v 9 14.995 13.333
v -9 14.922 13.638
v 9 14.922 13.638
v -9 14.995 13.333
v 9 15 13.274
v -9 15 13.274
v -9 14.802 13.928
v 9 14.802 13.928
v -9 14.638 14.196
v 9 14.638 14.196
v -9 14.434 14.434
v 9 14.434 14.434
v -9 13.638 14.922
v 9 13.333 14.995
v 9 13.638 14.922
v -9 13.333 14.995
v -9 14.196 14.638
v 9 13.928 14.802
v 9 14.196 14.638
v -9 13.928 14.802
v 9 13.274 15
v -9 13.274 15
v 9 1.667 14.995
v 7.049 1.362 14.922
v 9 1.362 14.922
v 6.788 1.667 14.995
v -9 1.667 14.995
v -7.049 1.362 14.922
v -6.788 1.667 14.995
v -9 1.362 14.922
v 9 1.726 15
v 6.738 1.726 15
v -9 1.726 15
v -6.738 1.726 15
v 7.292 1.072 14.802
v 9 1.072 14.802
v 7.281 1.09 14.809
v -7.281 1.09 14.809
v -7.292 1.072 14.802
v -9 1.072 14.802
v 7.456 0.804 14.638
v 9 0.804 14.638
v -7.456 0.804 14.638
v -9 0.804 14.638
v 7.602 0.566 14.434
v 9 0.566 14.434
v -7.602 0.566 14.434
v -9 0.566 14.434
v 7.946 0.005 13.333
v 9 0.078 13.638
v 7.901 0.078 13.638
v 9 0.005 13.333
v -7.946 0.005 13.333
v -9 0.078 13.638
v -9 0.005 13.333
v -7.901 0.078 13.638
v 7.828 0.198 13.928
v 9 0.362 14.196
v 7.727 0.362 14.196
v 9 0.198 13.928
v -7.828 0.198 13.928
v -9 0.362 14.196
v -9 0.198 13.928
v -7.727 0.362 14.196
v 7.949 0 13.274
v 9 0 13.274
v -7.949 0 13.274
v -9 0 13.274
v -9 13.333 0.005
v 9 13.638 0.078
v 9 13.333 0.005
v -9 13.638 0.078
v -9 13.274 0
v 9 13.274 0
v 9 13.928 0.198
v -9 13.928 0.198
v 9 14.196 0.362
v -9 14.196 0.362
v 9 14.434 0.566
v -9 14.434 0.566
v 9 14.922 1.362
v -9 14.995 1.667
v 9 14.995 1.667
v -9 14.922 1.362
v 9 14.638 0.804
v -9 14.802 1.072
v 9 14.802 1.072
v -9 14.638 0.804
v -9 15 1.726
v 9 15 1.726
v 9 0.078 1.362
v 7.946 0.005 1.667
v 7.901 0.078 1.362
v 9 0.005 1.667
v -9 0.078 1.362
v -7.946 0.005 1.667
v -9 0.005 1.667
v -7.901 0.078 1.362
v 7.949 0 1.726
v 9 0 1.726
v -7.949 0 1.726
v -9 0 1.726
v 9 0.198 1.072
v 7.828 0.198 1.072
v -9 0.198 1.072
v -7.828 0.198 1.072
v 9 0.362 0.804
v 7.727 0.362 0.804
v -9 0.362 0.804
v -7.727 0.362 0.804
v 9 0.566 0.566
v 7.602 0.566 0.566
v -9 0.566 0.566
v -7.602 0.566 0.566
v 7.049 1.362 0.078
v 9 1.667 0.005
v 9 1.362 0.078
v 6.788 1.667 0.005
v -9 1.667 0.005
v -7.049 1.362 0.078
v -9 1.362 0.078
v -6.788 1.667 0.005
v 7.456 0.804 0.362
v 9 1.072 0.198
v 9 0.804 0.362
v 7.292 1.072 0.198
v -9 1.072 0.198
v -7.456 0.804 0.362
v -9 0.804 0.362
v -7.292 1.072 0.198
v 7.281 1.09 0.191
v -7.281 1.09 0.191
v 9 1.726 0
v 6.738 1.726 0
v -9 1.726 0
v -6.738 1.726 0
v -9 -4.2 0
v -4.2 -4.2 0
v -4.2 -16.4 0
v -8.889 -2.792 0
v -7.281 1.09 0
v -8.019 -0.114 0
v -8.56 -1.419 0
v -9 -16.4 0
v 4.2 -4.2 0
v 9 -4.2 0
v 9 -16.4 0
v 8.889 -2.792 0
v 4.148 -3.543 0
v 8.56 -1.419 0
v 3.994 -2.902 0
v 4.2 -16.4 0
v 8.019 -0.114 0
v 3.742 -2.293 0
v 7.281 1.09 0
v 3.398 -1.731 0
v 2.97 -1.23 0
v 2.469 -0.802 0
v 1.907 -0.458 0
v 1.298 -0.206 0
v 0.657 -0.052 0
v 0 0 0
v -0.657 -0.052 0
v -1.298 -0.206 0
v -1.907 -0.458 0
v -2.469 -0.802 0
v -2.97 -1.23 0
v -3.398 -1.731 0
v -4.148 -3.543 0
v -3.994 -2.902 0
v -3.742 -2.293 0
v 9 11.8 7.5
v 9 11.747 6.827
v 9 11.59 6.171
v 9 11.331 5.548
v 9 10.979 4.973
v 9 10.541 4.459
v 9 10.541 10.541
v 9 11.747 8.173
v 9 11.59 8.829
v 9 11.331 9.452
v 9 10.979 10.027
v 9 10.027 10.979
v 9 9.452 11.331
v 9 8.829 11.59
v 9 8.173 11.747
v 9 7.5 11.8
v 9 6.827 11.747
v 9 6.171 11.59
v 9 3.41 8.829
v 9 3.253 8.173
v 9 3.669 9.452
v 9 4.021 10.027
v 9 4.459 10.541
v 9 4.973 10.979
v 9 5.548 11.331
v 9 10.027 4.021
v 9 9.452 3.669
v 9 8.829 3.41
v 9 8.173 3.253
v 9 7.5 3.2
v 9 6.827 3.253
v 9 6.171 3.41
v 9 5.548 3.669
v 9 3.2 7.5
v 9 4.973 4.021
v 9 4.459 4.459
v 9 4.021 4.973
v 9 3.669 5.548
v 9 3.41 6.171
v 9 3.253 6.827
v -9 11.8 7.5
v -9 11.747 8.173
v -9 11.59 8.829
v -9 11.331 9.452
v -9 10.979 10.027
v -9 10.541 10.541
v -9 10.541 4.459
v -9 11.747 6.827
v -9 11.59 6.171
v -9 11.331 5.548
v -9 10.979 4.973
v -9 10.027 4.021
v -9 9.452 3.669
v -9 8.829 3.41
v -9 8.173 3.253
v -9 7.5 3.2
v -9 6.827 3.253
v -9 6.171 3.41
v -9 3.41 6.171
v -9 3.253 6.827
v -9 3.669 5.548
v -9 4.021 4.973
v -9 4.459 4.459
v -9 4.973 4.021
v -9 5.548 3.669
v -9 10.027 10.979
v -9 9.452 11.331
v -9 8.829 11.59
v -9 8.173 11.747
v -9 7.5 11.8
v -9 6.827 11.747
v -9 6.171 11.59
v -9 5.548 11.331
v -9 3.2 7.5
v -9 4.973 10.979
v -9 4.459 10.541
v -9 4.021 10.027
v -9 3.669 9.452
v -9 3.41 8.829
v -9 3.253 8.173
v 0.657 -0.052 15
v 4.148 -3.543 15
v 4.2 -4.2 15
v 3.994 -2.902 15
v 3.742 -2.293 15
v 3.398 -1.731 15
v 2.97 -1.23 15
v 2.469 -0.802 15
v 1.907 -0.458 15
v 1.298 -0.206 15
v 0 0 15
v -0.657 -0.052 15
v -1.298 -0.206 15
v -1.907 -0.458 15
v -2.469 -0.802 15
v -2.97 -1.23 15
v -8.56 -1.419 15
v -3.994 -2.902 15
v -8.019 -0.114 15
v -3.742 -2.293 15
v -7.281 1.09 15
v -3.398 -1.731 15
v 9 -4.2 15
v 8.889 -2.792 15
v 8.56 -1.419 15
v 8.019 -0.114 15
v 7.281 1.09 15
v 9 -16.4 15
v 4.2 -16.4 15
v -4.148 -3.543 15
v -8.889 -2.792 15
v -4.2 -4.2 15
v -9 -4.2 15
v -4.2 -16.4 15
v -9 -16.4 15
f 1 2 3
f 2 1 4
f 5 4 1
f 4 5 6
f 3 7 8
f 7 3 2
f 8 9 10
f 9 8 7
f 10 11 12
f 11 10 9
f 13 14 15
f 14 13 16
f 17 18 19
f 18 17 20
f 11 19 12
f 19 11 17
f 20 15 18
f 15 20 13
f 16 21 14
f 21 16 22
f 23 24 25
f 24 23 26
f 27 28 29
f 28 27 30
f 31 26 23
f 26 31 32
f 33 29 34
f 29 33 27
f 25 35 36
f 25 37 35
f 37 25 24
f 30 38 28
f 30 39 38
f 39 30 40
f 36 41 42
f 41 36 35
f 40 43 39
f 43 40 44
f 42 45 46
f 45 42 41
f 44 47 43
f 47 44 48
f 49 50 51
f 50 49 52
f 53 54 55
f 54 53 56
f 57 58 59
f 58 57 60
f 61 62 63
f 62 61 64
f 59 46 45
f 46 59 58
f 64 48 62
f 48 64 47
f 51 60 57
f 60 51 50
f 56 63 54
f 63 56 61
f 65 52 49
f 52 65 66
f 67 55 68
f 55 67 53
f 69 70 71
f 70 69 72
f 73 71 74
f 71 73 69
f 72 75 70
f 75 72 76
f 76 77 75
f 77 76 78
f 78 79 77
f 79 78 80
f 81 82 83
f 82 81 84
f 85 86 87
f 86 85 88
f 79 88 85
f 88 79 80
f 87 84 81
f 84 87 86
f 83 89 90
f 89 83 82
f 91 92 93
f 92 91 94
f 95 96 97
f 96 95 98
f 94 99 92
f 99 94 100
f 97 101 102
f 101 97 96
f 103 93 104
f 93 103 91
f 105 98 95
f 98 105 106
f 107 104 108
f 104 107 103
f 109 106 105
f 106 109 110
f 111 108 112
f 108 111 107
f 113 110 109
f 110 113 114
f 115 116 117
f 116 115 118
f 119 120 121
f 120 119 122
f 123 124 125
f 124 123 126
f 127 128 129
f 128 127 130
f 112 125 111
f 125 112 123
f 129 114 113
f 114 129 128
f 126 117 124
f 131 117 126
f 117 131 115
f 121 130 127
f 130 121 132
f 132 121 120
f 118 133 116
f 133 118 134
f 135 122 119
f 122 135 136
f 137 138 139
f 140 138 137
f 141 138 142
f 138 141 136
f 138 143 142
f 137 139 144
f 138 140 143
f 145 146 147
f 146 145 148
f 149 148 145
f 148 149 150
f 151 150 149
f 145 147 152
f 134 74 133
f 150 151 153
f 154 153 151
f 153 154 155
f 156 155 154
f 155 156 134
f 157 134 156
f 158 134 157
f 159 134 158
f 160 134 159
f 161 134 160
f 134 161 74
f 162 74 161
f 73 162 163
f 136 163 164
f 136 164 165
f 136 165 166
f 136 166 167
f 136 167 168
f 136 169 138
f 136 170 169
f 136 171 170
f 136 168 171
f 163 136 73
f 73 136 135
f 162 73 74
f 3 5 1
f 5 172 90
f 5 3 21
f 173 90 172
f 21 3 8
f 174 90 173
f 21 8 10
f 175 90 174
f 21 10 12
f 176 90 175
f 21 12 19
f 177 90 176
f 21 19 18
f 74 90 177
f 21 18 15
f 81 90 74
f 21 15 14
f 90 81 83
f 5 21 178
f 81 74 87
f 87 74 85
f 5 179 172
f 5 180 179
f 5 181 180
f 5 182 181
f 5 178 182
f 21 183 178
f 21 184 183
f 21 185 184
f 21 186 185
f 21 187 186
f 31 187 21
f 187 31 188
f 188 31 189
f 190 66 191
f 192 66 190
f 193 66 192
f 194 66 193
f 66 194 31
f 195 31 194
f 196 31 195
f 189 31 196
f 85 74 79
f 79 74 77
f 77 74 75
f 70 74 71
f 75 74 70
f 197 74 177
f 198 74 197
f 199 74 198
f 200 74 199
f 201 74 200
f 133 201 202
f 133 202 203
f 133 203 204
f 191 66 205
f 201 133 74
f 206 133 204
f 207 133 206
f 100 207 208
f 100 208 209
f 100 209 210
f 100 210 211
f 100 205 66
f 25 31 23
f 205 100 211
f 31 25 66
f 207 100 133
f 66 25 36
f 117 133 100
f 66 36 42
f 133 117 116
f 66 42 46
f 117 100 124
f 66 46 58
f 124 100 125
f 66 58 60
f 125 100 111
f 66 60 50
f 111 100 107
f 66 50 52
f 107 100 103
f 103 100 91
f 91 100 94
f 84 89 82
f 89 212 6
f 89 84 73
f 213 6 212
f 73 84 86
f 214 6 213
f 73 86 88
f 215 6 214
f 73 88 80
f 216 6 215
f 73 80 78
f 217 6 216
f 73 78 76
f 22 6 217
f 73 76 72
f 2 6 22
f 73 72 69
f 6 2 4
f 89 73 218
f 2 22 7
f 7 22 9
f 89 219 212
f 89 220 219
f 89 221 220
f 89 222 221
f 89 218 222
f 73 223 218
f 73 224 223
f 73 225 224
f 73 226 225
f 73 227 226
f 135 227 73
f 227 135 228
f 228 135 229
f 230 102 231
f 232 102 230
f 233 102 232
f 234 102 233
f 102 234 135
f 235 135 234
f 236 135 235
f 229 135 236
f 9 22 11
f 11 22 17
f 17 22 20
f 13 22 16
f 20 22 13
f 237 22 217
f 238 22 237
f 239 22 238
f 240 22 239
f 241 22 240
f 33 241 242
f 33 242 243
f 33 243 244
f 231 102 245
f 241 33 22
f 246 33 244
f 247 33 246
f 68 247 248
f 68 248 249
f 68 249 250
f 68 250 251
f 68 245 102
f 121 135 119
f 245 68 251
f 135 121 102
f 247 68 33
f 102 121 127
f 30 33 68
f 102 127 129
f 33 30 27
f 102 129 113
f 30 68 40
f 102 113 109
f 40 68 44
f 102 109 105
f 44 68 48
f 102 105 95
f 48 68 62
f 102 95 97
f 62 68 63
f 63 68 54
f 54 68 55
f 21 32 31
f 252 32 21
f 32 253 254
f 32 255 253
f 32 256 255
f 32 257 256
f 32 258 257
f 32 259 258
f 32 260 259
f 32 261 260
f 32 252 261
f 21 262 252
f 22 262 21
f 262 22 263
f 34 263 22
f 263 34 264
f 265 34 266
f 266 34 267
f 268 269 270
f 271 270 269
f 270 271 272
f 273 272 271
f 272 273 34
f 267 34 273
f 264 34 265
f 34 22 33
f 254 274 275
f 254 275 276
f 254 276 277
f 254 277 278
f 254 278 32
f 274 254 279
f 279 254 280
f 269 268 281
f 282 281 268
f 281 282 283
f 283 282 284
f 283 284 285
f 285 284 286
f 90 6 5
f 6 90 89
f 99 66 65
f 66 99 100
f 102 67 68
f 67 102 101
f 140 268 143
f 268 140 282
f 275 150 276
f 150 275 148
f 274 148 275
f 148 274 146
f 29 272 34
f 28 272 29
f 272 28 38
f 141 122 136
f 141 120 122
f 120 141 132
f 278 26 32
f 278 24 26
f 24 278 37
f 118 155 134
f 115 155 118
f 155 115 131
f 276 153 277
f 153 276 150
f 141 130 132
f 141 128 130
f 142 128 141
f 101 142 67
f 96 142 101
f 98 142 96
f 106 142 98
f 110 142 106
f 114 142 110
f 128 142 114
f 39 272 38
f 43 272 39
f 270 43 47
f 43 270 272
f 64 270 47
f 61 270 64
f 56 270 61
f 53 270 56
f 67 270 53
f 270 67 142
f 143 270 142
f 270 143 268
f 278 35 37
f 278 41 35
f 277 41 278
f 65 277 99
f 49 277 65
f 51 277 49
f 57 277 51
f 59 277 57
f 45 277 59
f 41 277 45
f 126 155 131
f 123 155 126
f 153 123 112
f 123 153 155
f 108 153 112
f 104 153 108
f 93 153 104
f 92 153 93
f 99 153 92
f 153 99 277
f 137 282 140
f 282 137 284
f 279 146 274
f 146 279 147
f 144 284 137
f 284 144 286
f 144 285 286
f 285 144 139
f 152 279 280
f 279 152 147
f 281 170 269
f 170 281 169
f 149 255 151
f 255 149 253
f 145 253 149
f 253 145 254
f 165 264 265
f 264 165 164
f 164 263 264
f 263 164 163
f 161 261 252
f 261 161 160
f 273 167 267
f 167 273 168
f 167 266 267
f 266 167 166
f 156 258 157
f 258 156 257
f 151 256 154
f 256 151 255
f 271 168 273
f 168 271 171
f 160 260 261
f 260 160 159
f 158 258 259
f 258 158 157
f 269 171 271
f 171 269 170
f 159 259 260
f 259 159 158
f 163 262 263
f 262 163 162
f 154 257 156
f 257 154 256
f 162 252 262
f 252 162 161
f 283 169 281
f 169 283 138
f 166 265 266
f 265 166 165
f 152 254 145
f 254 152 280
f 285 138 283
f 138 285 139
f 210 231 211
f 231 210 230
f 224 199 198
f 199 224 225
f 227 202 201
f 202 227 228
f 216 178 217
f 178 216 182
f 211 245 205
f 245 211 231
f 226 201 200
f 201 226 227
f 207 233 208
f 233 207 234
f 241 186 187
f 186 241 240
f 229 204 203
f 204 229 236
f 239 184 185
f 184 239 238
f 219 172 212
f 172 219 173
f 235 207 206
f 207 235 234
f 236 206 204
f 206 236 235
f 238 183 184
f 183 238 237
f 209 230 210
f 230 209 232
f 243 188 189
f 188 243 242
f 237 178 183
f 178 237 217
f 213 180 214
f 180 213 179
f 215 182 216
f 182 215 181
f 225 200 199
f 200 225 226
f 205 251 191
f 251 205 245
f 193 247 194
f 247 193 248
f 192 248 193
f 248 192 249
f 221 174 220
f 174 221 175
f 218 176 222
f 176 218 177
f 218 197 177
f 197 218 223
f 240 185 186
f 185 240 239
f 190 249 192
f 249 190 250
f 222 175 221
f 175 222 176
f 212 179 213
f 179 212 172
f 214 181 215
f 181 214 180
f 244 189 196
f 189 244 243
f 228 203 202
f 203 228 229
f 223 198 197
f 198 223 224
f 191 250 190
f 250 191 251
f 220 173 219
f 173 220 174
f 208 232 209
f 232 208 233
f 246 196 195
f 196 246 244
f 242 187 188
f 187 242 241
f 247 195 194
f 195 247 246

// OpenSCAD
// file: library/component-data.scad
// ========================================================================================
// Robori Mendel
// Dimensions of standard components
// GNU GPL v3
//
// Contact : support@robori.com
// Reference : http://www.robori.com/documentation/Mendel
//
// History :
// 31 Jan 2015 - First version
// ========================================================================================

// Linear bearing LM8UU
LM8UU_L = 24;
LM8UU_OD = 15;
LM8UU_ID = 8;

// Pulley GT2
PULLEY_GT2_ID = 5;
PULLEY_GT2_OD = 18;
PULLEY_GT2_L = 18.5;
PULLEY_GT2_FLANGE_L = 1.5;
PULLEY_GT2_TEETH_L = 7.5;
PULLEY_GT2_TEETH_OD = 10;
PULLEY_GT2_HUB_L =  PULLEY_GT2_L - PULLEY_GT2_FLANGE_L - PULLEY_GT2_TEETH_L;		// = 9.5

// Nylock nut
NYLOCK_NUT_M5_H = 5;

// NEMA 17
NEMA17_L = 42;
NEMA17_SCREW_FROM_EDGE = (42 - 31)/2;
NEMA17_SCREW_SIZE = 3;

// Fan 40mm x 40mm
FAN40_L = 40;
FAN40_ID = 38;
FAN40_SCREW_D = 3.4;
FAN40_SCREW_FROM_EDGE = 4;

// Washer
WASHER_M3_ID = 3.2;
WASHER_M3_OD = 6;
WASHER_M3_H = 0.5;
// file: library/component.scad
// ========================================================================================
// Robori Mendel
// RP library
// GNU GPL v3
//
// Contact : support@robori.com
// Reference : http://www.robori.com/documentation/Mendel
//
// History :
// 31 Jan 2015 - First version
// ========================================================================================

include <component-data.scad>

component_fn = 25;

// Rod clamp
module clamp(in_dia, out_dia, leg_length, leg_space, height, screw_dia, screw_dist_from_end)
{
	difference()
	{
		union()
		{
			cylinder(h=height, r=out_dia/2, center=false, $fn=component_fn);
			translate([-out_dia/2, -in_dia/2 - leg_length, 0]) cube([out_dia, in_dia/2 + leg_length, height]);
		}
		// hole
		translate([0, 0, -1]) cylinder(h=height + 2, r=in_dia/2, center=false, $fn=component_fn);
		// leg space
		translate([-leg_space/2, -in_dia/2 - leg_length - 1, -1]) cube([leg_space, in_dia/2 + leg_length + 1, height + 2]);
		// screw hole
		translate([-out_dia/2 - 1, -in_dia/2 - leg_length + screw_dist_from_end, height/2]) rotate([0, 90, 0]) cylinder(h=out_dia + 2, r=screw_dia/2, center=false, $fn=component_fn);
	}
}

// LM8UU holder
lm8uu_holder_wall_t = 3;
lm8uu_holder_cone_l = 2;
lm8uu_holder_slot_w = 9;
lm8uu_holder_id = LM8UU_OD - 0.1;
lm8uu_holder_l = LM8UU_L + lm8uu_holder_cone_l;
lm8uu_holder_w = LM8UU_OD + 2*lm8uu_holder_wall_t;
lm8uu_holder_h = LM8UU_OD + 2*lm8uu_holder_cone_l;

module lm8uu_holder()
{
	cone_d1 = 0;
	cone_d2 = LM8UU_OD + 2*lm8uu_holder_cone_l;
	cone_h = cone_d2/2;

	difference()
	{
		// Block
		cube([lm8uu_holder_l, lm8uu_holder_w, lm8uu_holder_h]);
		// Cylinder
		translate([-1, lm8uu_holder_w/2, lm8uu_holder_cone_l + LM8UU_OD/2]) rotate([0, 90, 0]) cylinder(r=lm8uu_holder_id/2, h=lm8uu_holder_l + 2, center=false, $fn=component_fn);
		// Cone
		translate([lm8uu_holder_l - cone_h + 0.01, lm8uu_holder_w/2, lm8uu_holder_cone_l + LM8UU_OD/2]) rotate([0, 90, 0]) cylinder(r1=cone_d1/2, r2=cone_d2/2, h=cone_h, center=false, $fn=component_fn);
		// Slot
		translate([-1, lm8uu_holder_w/2 - lm8uu_holder_slot_w/2, lm8uu_holder_h - lm8uu_holder_cone_l*2 - 1]) cube([lm8uu_holder_l + 2, lm8uu_holder_slot_w, lm8uu_holder_cone_l*2 + 2]);
	}
}
// file: library/library_3d.scad
// ========================================================================================
// Robori Mendel
// General 3D library
// GNU GPL v3
//
// Contact : support@robori.com
// Reference : http://www.robori.com/documentation/Mendel
//
// History :
// 2013 - First version
// ========================================================================================

lib3d_fn = 50;

// TESTING
//lib3d_hex_nut_recess(3);
//lib3d_round_cube(10, 8, 10, 1, true, false, true, false);


// Hexagonal nut recess
module lib3d_hex_nut_recess(size)
{
	length = 0.8*size;
	hex_r = 1.8*size/2;
	cylinder(h=length, r=hex_r, center=false, $fn=6);
}

// Cube with customized rounded corners
module lib3d_round_cube(x, y, z, rad, left_top=true, left_bottom=true, right_top=true, right_bottom=true)
{
	rx = x/2 - rad + 0.02;
	ry = y/2 - rad + 0.02;

	translate([x/2, y/2, 0]) difference()
	{	
		translate([-x/2, -y/2, 0]) cube([x, y, z]);
		if (left_top)
			translate([-rx, ry, -1]) rotate([0, 0, 90]) __lib3d_round_corner(rad, z + 2);
		if (left_bottom)
			translate([-rx, -ry, -1]) rotate([0, 0, 180]) __lib3d_round_corner(rad, z + 2);
		if (right_top)
			translate([rx, ry, -1]) __lib3d_round_corner(rad, z + 2);
		if (right_bottom)
			translate([rx, -ry, -1]) rotate([0, 0, 270]) __lib3d_round_corner(rad, z + 2);
	}
}

// Helper
module __lib3d_round_corner(rad, height)
{
	difference()
	{
		cube([rad, rad, height]);
		cylinder(h=height, r=rad, center=false, $fn=lib3d_fn);
	}
}
// main file
// ========================================================================================
// Robori Mendel
// Filament holder end
// GNU GPL v3
//
// Contact : support@robori.com
// Reference : http://www.robori.com/documentation/Mendel
//
// History :
// 17 Jun 2015 - First version
// ========================================================================================

include <library/library_3d.scad>
include <library/component.scad>

$fn = 40;
lib3d_fn = 40;
component_fn = 40;

// rod holder
holder_l = 18;
holder_w = 15;
holder_h = 15;
holder_id = 8 + 0.6;
holder_r = 2;

// clamp
clamp_id = 8 + 0.4;
clamp_od = 8 + 2*5;
clamp_leg_length = 8;
clamp_leg_space = 8 + 0.4;
clamp_h = 15;
clamp_screw_d = 0;
clamp_screw_dist = 0;

filament_holder_end();

module filament_holder_end()
{
	difference()
	{
		union()
		{
			// rod holder block
			translate([-holder_l/2, 0, holder_h]) rotate([0, 90, 0]) lib3d_round_cube(holder_h, holder_w, holder_l, holder_r, true, true, true, true);
			// clamp
			translate([0, -clamp_id/2, 0]) clamp(clamp_id, clamp_od, clamp_leg_length, clamp_leg_space, clamp_h, clamp_screw_d, clamp_screw_dist);
		}
		// rod holder hole 
		translate([-holder_l/2 - 1, holder_w/2, holder_h/2]) rotate([0, 90, 0]) cylinder(r=holder_id/2, h=holder_l + 2, center=false);
	}
}
